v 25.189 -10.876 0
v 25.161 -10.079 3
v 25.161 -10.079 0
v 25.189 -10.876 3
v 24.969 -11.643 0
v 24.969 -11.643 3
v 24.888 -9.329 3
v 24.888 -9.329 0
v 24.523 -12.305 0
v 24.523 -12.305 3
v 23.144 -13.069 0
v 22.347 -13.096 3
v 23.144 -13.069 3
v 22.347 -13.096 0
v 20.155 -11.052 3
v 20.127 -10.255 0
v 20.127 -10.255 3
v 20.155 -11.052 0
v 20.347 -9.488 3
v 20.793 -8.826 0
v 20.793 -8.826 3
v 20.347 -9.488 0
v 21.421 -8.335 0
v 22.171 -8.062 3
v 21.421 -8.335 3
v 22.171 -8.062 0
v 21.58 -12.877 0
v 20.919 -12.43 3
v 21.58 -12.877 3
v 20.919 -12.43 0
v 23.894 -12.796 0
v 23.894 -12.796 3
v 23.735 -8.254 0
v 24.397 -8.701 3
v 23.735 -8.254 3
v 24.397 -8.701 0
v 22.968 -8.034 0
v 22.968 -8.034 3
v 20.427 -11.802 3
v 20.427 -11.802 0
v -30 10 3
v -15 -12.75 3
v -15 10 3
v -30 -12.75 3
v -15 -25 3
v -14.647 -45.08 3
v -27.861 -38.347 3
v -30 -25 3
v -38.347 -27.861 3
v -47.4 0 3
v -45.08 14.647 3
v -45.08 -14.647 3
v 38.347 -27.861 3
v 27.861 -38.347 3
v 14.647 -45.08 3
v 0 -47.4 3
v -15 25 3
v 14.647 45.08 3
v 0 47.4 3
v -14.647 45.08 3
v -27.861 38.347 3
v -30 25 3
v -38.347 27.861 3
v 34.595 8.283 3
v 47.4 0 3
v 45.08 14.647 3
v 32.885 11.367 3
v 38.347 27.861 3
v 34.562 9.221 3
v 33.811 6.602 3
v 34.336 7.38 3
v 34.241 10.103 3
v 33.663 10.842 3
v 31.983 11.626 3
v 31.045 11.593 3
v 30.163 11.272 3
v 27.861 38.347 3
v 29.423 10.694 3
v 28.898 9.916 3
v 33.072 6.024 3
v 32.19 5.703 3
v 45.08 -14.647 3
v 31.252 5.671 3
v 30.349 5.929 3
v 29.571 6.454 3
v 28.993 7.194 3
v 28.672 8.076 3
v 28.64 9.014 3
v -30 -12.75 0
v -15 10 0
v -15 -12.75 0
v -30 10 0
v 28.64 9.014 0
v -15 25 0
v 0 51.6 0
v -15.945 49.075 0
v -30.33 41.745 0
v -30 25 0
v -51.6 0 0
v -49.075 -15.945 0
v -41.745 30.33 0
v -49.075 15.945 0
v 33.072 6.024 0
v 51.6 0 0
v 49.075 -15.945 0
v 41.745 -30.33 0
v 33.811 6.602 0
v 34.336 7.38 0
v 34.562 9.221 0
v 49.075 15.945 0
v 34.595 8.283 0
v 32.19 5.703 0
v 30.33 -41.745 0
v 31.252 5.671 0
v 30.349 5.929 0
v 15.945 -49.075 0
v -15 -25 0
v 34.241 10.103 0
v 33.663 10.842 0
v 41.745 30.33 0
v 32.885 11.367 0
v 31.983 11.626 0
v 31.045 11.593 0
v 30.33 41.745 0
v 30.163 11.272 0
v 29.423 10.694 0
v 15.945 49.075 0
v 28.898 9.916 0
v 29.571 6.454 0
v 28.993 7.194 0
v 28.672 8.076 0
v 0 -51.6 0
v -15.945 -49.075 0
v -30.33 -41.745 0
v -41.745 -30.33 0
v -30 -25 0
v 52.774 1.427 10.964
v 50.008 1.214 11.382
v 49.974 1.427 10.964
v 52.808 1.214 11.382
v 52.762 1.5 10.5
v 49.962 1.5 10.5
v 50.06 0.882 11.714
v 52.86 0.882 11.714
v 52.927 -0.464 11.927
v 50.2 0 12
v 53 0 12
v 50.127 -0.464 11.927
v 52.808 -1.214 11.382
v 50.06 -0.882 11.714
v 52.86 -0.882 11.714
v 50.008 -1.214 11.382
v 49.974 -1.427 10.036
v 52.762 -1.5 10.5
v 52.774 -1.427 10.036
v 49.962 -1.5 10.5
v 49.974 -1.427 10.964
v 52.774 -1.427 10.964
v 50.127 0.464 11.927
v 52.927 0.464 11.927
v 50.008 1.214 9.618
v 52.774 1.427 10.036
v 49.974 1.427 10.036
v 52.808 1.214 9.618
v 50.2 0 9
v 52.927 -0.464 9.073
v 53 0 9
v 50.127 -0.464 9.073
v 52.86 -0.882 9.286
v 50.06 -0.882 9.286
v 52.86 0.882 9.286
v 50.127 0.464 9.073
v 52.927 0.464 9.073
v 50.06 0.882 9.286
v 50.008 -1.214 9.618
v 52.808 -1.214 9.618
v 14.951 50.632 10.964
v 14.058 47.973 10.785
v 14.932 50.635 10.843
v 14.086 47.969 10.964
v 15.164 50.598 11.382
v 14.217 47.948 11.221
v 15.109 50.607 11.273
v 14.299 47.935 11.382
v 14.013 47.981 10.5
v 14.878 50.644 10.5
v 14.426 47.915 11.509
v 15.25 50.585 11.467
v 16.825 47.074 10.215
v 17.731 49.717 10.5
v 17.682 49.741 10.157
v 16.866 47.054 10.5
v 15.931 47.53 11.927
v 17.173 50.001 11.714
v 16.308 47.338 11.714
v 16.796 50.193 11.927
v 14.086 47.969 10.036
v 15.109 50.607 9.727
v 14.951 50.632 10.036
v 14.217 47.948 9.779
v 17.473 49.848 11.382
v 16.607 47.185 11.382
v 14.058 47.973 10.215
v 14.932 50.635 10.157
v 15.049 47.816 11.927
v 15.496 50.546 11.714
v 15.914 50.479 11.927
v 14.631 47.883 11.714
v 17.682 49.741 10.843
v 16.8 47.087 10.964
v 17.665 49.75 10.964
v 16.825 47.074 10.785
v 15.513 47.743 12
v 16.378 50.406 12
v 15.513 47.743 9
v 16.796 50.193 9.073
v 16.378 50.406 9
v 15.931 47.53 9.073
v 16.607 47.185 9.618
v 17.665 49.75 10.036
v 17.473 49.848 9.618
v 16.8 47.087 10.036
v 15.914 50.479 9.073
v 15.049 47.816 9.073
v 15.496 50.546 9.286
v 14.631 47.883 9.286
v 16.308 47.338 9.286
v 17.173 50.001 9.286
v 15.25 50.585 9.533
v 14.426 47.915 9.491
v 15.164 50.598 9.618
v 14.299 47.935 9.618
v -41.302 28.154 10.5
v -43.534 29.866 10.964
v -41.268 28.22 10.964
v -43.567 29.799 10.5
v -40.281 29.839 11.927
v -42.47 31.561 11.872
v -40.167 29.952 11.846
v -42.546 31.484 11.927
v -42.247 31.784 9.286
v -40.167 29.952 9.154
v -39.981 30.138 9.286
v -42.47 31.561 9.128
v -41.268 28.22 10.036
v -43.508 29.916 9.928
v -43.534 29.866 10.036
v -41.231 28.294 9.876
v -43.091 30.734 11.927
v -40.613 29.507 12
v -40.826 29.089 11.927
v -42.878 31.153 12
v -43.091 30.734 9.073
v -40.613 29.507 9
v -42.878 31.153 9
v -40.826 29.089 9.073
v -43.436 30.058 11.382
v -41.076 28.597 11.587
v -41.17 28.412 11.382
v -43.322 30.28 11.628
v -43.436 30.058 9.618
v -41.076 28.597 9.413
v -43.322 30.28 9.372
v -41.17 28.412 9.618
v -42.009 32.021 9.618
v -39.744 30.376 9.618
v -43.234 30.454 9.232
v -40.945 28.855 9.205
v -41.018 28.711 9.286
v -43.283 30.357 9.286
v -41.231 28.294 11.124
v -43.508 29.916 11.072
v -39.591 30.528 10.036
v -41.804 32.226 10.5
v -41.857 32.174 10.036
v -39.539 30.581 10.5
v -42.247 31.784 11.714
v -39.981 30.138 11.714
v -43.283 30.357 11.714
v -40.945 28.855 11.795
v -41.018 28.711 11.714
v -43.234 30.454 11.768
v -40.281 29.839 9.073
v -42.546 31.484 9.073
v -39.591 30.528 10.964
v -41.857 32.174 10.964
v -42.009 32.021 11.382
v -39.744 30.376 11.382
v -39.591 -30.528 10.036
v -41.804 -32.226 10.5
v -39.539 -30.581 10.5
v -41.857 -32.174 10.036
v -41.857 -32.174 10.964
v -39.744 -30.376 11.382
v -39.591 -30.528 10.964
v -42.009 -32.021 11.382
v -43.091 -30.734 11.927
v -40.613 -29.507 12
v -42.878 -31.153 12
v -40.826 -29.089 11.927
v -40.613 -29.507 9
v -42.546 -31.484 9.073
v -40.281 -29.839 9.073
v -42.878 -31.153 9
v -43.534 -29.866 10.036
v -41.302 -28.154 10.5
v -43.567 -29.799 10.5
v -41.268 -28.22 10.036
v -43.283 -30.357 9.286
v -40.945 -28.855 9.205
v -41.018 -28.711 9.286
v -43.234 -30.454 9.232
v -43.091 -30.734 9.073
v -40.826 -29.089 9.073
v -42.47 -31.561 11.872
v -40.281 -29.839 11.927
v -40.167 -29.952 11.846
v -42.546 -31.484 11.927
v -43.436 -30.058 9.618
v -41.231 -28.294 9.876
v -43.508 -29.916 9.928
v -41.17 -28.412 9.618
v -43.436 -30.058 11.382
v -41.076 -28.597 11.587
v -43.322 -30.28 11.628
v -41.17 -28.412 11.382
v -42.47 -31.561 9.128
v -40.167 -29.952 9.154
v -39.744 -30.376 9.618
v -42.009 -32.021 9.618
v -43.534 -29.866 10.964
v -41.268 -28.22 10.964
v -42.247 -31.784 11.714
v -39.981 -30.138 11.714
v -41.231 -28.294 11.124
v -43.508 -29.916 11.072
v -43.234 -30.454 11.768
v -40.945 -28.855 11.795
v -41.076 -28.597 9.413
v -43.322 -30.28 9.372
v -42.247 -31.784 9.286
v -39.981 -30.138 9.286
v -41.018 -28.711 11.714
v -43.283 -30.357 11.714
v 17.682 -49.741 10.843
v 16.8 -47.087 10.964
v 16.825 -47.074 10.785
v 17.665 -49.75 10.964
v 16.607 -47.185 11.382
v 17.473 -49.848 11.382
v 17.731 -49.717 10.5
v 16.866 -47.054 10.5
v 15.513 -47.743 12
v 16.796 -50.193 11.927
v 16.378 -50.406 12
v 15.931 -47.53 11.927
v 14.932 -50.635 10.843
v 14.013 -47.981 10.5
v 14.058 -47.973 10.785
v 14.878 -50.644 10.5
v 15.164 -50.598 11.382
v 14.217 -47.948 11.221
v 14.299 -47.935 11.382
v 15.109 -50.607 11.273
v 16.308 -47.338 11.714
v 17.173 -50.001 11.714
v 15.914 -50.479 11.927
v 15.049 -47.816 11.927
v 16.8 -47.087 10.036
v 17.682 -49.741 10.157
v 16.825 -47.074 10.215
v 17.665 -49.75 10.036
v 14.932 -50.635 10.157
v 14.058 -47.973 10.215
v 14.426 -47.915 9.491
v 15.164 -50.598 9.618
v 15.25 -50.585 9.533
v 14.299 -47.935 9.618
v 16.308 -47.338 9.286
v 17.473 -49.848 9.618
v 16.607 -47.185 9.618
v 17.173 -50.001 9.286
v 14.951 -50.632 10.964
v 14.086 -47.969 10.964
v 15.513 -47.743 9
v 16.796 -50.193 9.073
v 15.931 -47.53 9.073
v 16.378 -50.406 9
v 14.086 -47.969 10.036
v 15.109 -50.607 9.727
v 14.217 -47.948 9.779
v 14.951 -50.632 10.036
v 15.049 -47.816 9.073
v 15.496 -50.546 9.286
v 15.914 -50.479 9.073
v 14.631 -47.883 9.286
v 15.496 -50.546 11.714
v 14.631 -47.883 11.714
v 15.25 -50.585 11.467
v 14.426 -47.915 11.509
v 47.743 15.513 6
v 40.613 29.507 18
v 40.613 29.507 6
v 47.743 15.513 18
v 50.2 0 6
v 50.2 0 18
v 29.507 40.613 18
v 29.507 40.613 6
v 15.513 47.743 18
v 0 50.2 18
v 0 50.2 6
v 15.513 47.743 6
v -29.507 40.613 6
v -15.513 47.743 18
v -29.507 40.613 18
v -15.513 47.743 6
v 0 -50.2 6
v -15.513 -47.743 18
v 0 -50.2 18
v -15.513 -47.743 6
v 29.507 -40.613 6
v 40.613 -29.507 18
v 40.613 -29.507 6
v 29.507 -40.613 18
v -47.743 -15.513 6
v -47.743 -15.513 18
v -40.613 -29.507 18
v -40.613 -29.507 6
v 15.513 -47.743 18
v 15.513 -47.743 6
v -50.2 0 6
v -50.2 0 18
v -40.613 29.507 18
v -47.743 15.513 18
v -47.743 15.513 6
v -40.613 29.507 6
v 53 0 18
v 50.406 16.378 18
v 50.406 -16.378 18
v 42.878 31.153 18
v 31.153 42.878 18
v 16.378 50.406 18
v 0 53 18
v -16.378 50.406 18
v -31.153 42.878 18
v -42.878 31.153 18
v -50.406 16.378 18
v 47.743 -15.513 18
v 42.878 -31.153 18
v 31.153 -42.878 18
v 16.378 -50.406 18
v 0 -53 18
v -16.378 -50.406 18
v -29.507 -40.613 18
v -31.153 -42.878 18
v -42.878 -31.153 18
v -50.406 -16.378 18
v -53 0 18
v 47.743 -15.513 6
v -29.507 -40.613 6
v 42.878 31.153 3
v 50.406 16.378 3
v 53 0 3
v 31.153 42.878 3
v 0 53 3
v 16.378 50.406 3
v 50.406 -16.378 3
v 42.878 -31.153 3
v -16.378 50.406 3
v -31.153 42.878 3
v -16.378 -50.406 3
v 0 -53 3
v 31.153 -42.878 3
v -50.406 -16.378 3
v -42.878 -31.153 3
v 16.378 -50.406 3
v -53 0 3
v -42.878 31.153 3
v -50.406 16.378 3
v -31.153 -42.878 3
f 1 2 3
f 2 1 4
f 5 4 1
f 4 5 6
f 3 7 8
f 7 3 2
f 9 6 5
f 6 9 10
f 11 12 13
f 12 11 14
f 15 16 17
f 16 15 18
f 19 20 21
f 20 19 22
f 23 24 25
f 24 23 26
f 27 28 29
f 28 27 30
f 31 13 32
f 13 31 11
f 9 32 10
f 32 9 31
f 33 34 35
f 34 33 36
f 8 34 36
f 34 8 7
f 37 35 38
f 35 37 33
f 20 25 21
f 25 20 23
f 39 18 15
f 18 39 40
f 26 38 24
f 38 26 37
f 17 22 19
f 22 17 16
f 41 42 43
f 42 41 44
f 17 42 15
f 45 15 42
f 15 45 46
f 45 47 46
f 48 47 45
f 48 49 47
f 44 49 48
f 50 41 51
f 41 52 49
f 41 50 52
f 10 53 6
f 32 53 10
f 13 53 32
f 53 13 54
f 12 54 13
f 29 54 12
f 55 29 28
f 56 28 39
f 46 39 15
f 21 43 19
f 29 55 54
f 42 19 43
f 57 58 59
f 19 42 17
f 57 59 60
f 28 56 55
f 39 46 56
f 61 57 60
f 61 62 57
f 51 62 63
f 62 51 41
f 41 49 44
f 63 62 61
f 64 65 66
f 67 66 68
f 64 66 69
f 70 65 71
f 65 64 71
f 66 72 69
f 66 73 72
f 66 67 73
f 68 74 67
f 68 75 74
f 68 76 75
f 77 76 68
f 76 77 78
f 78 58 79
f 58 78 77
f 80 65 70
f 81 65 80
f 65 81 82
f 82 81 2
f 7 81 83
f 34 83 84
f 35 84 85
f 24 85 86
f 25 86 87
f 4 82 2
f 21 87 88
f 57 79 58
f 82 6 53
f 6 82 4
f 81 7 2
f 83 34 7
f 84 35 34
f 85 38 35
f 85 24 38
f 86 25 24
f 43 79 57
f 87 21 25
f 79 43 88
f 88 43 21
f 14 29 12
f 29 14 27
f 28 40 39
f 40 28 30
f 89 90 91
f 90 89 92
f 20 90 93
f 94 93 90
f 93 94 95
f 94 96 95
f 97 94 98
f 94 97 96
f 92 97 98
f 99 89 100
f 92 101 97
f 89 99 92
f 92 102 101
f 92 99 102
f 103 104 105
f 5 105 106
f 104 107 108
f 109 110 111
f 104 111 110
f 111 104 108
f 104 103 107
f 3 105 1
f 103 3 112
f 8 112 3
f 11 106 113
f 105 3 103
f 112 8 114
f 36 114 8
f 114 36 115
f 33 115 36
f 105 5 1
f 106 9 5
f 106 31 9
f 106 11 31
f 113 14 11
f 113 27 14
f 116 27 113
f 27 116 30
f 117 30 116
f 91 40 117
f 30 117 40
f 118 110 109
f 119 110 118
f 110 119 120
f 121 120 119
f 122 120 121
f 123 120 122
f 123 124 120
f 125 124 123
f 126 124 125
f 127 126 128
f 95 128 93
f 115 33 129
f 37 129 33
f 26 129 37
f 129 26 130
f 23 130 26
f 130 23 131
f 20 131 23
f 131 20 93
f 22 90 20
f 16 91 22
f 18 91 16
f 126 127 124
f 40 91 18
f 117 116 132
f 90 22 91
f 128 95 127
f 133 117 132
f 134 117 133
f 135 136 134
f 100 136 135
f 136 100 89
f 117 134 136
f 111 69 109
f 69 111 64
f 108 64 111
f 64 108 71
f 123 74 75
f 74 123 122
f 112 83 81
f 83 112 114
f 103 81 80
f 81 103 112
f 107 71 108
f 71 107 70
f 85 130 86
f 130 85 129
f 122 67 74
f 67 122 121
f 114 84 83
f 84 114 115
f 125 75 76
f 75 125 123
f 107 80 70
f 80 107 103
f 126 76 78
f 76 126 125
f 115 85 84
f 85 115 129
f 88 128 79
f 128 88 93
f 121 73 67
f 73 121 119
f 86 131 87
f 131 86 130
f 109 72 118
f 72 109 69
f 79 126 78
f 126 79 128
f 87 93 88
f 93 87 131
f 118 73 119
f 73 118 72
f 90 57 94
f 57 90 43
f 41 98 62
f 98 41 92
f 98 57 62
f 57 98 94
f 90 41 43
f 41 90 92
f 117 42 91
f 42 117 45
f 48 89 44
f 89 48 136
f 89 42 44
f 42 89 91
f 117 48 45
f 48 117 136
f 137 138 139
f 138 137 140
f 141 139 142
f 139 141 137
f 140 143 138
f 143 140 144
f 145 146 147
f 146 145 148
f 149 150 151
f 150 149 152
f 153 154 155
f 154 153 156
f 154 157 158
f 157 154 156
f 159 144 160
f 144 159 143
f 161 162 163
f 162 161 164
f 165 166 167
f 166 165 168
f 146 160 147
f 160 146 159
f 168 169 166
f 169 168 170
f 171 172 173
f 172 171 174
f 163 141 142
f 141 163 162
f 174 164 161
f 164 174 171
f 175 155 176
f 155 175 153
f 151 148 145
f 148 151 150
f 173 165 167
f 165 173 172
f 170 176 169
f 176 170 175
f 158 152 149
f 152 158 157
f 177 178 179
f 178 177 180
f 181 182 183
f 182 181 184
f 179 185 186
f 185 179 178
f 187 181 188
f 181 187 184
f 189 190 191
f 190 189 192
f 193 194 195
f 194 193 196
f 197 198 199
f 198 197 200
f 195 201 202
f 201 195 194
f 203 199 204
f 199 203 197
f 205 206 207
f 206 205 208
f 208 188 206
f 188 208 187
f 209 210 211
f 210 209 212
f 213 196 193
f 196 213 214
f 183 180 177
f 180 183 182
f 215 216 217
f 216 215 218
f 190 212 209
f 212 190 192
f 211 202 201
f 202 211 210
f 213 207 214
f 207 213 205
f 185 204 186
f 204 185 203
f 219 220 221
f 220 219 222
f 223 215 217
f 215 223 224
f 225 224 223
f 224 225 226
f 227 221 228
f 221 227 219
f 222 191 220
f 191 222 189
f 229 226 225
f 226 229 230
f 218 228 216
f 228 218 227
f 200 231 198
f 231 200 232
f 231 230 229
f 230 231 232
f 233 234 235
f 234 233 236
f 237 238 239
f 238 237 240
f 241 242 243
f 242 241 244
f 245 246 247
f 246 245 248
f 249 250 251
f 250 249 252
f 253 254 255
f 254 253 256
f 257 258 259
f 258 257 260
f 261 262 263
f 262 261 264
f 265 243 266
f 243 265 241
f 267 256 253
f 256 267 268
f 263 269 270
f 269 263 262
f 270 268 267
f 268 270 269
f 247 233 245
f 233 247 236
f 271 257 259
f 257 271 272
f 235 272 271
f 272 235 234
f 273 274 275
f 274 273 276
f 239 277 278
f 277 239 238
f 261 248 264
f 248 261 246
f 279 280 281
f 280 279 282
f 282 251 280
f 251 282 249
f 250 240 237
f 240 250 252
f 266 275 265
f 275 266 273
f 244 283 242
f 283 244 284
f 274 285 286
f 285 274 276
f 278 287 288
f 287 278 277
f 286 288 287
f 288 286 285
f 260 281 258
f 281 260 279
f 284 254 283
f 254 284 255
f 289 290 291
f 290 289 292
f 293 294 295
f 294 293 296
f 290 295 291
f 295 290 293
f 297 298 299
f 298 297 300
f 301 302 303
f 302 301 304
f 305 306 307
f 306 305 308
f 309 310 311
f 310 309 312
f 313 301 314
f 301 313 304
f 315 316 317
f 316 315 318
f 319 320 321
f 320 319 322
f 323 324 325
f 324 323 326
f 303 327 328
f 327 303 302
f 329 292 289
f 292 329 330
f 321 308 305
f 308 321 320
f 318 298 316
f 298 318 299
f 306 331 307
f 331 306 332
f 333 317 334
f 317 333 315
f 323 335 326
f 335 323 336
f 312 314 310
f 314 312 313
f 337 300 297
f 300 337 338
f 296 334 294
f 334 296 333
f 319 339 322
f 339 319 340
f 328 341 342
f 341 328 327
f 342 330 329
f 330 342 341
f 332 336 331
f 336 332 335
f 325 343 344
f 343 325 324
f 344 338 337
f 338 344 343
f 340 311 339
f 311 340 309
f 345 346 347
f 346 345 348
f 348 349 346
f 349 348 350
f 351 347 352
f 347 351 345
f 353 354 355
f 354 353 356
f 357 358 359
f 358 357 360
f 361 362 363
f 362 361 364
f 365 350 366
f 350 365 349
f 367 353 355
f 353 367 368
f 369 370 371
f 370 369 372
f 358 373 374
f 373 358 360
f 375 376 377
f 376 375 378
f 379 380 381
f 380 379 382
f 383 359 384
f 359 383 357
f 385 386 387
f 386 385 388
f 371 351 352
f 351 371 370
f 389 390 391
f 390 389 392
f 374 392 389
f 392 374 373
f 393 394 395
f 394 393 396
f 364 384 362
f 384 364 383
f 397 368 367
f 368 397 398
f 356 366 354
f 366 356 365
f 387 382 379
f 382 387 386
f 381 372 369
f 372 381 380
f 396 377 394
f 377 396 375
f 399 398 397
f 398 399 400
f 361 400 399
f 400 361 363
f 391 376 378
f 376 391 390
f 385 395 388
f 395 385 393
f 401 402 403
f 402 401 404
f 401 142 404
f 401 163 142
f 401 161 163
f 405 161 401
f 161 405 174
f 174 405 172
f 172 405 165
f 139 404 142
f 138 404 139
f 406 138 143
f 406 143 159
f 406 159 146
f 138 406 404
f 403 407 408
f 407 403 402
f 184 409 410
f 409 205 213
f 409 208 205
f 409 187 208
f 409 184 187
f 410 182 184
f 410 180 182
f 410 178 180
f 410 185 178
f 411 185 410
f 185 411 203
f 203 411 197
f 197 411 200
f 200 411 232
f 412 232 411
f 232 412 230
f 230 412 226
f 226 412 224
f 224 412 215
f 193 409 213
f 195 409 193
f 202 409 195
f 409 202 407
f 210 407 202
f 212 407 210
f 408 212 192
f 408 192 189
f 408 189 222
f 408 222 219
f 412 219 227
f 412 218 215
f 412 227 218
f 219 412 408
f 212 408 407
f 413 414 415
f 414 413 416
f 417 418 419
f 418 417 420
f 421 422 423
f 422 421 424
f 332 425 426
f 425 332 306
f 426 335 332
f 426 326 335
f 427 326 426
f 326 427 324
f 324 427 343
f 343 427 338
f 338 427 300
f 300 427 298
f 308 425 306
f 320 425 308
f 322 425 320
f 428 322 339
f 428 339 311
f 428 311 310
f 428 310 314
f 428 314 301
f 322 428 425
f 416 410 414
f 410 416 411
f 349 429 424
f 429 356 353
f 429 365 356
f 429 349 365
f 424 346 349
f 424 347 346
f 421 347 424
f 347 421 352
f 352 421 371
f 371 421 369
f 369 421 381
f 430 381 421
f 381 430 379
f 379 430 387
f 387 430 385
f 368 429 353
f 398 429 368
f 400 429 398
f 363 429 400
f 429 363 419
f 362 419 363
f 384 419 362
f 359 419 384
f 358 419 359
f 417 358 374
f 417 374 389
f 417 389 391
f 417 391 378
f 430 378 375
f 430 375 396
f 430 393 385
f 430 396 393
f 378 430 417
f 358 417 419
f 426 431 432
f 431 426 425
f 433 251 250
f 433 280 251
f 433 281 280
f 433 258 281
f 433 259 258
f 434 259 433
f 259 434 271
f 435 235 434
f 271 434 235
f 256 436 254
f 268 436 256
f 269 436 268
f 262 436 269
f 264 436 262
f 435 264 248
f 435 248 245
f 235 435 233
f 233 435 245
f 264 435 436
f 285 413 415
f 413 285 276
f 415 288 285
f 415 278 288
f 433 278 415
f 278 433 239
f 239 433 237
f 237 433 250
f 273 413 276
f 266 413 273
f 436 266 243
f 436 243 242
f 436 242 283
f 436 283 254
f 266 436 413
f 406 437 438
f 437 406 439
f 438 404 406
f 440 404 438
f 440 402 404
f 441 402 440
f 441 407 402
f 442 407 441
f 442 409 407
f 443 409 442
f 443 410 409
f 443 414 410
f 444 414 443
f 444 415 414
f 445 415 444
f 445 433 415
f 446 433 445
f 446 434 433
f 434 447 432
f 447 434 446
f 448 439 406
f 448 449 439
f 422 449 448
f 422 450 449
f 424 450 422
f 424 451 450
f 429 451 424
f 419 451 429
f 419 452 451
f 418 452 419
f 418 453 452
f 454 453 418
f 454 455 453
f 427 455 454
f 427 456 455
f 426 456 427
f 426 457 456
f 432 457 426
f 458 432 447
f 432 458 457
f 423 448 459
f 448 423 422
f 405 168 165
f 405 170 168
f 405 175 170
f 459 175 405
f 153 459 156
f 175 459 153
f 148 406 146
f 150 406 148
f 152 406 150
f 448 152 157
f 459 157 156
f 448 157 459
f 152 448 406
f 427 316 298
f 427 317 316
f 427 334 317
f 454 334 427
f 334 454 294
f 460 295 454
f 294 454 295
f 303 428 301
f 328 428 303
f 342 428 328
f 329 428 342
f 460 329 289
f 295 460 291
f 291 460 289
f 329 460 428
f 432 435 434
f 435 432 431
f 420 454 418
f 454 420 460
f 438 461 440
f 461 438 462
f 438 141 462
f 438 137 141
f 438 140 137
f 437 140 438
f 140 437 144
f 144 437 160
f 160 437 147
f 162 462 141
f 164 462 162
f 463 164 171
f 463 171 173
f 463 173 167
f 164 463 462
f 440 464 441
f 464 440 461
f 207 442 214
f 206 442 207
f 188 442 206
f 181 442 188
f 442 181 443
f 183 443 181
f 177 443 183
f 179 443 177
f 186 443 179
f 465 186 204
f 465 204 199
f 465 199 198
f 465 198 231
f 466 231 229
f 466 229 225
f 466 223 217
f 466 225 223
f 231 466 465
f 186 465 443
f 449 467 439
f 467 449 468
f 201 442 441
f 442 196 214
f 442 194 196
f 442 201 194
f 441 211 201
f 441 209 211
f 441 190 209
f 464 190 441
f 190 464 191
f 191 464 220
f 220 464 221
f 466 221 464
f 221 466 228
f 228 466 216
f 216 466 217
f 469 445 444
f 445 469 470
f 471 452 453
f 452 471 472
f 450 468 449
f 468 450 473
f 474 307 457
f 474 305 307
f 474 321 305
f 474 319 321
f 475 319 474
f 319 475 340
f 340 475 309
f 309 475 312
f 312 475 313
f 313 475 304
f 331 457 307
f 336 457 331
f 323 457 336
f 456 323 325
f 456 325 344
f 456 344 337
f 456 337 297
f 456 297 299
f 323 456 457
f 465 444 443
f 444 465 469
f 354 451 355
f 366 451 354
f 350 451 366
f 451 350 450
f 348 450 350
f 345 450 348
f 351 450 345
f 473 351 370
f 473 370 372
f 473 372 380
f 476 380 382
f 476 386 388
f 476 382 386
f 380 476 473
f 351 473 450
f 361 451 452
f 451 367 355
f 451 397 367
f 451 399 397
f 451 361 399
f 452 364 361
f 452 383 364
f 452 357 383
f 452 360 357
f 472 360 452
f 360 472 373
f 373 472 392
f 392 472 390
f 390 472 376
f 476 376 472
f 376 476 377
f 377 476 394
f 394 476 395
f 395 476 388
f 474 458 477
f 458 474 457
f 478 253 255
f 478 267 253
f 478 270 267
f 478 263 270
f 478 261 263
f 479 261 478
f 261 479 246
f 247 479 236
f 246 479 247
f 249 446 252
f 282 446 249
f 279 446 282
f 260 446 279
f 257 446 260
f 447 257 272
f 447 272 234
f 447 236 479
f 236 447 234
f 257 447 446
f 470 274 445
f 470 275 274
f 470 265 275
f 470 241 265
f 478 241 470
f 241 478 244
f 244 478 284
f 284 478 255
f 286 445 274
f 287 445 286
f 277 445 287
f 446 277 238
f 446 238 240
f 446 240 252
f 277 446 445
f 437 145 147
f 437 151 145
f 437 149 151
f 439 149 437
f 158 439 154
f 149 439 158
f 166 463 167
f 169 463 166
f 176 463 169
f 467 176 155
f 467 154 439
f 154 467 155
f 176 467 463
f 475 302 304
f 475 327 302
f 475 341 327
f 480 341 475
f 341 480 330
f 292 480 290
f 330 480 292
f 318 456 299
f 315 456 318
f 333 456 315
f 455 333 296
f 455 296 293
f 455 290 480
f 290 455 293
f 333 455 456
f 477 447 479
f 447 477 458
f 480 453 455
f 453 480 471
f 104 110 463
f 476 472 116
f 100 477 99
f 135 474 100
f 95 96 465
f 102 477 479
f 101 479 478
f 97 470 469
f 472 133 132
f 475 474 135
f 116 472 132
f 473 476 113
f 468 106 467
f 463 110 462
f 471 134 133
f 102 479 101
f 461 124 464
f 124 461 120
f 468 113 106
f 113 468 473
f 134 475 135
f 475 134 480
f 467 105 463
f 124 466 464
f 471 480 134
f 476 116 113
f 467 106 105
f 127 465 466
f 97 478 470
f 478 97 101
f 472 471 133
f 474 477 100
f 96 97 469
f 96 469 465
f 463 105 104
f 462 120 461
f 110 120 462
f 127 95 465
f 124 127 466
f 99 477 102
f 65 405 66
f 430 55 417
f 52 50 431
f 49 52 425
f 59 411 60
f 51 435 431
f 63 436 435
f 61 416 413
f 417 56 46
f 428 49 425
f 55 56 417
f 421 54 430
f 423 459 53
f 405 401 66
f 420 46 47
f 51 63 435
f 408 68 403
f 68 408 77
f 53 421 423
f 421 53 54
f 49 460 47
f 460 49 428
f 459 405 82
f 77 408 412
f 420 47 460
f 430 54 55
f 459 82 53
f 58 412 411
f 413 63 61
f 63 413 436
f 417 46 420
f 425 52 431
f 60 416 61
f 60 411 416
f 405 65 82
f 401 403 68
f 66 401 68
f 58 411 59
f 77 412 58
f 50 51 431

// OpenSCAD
/* pod-endbell-1
   POD endbell insert for POD #1
   03/03/2017
*/

dia_od = (106); // diameter (inside of bottle)

width_centerrim = 10;
width_centerbar = 14;


thick_bottom = 3;	// Bottom of endbell
thick_sides = 2.8;	// Sides
height_sides = 15;	// Height of sides
$fn = 20;

module base()
{
//    difference()
    {
    cylinder(h = thick_bottom,
       d = (dia_od-2*thick_sides),
       center = false);
//    cylinder(h = thick_bottom,
//       d = (dia_od  - 2*thick_sides - 2* width_centerrim),
//       center = false);
    }
}

module chamfer()
{
     // Sides with chamfer at bottom edge
    difference()
     {
        cylinder(h = thick_bottom, 
           r1 = (dia_od - thick_sides)/2, 
           r2 = dia_od/2, 
           center = false);
        cylinder(h = thick_bottom, 
          d = (dia_od - 2*thick_sides), 
          center = false);
     }
 }
module ring()
{
     // Sides
     translate([0,0,thick_bottom])
        difference()
        {  
           cylinder(h = height_sides, 
              d = (dia_od),
              center = false);
         union()
         {
           cylinder(h = height_sides, 
              d = (dia_od - 2* thick_sides),
              center = false);
 	   side_holes();
         }

        }
     
    chamfer();
     
     // Inside fillet
     difference()
     {
        translate([0,0,thick_bottom])
           cylinder(h = thick_bottom,
              d = (dia_od - 2*thick_sides),
              center = false);
        translate([0,0,thick_bottom])
          cylinder(h = thick_bottom, 
              r1 = (dia_od - 4*thick_sides)/2, 
              r2 = (dia_od - 2*thick_sides)/2, 
              center = false);
     }
}
led_dia = 5.1;	// Dia of hole for LED
sw_dia = 6.0;	// Dia of hole for sw access
module ledsw_holes()
{
   translate([25,0,0])
      cylinder(d = led_dia, h = thick_bottom, center = false);
   translate([25,21.2,0])
        cylinder(d =  sw_dia, h = thick_bottom, center = false);
}
module rj_cutouts()
{
   // RJ45
   translate([-30,10,0])
      cube([15,15,thick_bottom+.01],center = false);
   // RJ 11
   rotate([0,0,0])
   translate([-30,-25,0])
      cube([15,12.25,thick_bottom],center = false);
}
module side_hole()
{
      translate([dia_od/2-thick_sides*2,0,height_sides/2])
      rotate([90,0,90])
        cylinder(d = 3.0, h = thick_sides*8, center = true);
}
module side_holes()
{
   for (a = [0:72:359])
   {
      rotate([0,0,a])
       translate([0,0,0])
         side_hole();
   }

}


module main()
{
   difference()
   {
      union()
      {
         base();
//	 side_holes();
      }
      union()
      {
         rotate([0,0,-25])
             ledsw_holes();
         rotate([0,0,0])    
	     rj_cutouts();
//	 side_holes();

      }
   }



   ring();
   
}
main();
